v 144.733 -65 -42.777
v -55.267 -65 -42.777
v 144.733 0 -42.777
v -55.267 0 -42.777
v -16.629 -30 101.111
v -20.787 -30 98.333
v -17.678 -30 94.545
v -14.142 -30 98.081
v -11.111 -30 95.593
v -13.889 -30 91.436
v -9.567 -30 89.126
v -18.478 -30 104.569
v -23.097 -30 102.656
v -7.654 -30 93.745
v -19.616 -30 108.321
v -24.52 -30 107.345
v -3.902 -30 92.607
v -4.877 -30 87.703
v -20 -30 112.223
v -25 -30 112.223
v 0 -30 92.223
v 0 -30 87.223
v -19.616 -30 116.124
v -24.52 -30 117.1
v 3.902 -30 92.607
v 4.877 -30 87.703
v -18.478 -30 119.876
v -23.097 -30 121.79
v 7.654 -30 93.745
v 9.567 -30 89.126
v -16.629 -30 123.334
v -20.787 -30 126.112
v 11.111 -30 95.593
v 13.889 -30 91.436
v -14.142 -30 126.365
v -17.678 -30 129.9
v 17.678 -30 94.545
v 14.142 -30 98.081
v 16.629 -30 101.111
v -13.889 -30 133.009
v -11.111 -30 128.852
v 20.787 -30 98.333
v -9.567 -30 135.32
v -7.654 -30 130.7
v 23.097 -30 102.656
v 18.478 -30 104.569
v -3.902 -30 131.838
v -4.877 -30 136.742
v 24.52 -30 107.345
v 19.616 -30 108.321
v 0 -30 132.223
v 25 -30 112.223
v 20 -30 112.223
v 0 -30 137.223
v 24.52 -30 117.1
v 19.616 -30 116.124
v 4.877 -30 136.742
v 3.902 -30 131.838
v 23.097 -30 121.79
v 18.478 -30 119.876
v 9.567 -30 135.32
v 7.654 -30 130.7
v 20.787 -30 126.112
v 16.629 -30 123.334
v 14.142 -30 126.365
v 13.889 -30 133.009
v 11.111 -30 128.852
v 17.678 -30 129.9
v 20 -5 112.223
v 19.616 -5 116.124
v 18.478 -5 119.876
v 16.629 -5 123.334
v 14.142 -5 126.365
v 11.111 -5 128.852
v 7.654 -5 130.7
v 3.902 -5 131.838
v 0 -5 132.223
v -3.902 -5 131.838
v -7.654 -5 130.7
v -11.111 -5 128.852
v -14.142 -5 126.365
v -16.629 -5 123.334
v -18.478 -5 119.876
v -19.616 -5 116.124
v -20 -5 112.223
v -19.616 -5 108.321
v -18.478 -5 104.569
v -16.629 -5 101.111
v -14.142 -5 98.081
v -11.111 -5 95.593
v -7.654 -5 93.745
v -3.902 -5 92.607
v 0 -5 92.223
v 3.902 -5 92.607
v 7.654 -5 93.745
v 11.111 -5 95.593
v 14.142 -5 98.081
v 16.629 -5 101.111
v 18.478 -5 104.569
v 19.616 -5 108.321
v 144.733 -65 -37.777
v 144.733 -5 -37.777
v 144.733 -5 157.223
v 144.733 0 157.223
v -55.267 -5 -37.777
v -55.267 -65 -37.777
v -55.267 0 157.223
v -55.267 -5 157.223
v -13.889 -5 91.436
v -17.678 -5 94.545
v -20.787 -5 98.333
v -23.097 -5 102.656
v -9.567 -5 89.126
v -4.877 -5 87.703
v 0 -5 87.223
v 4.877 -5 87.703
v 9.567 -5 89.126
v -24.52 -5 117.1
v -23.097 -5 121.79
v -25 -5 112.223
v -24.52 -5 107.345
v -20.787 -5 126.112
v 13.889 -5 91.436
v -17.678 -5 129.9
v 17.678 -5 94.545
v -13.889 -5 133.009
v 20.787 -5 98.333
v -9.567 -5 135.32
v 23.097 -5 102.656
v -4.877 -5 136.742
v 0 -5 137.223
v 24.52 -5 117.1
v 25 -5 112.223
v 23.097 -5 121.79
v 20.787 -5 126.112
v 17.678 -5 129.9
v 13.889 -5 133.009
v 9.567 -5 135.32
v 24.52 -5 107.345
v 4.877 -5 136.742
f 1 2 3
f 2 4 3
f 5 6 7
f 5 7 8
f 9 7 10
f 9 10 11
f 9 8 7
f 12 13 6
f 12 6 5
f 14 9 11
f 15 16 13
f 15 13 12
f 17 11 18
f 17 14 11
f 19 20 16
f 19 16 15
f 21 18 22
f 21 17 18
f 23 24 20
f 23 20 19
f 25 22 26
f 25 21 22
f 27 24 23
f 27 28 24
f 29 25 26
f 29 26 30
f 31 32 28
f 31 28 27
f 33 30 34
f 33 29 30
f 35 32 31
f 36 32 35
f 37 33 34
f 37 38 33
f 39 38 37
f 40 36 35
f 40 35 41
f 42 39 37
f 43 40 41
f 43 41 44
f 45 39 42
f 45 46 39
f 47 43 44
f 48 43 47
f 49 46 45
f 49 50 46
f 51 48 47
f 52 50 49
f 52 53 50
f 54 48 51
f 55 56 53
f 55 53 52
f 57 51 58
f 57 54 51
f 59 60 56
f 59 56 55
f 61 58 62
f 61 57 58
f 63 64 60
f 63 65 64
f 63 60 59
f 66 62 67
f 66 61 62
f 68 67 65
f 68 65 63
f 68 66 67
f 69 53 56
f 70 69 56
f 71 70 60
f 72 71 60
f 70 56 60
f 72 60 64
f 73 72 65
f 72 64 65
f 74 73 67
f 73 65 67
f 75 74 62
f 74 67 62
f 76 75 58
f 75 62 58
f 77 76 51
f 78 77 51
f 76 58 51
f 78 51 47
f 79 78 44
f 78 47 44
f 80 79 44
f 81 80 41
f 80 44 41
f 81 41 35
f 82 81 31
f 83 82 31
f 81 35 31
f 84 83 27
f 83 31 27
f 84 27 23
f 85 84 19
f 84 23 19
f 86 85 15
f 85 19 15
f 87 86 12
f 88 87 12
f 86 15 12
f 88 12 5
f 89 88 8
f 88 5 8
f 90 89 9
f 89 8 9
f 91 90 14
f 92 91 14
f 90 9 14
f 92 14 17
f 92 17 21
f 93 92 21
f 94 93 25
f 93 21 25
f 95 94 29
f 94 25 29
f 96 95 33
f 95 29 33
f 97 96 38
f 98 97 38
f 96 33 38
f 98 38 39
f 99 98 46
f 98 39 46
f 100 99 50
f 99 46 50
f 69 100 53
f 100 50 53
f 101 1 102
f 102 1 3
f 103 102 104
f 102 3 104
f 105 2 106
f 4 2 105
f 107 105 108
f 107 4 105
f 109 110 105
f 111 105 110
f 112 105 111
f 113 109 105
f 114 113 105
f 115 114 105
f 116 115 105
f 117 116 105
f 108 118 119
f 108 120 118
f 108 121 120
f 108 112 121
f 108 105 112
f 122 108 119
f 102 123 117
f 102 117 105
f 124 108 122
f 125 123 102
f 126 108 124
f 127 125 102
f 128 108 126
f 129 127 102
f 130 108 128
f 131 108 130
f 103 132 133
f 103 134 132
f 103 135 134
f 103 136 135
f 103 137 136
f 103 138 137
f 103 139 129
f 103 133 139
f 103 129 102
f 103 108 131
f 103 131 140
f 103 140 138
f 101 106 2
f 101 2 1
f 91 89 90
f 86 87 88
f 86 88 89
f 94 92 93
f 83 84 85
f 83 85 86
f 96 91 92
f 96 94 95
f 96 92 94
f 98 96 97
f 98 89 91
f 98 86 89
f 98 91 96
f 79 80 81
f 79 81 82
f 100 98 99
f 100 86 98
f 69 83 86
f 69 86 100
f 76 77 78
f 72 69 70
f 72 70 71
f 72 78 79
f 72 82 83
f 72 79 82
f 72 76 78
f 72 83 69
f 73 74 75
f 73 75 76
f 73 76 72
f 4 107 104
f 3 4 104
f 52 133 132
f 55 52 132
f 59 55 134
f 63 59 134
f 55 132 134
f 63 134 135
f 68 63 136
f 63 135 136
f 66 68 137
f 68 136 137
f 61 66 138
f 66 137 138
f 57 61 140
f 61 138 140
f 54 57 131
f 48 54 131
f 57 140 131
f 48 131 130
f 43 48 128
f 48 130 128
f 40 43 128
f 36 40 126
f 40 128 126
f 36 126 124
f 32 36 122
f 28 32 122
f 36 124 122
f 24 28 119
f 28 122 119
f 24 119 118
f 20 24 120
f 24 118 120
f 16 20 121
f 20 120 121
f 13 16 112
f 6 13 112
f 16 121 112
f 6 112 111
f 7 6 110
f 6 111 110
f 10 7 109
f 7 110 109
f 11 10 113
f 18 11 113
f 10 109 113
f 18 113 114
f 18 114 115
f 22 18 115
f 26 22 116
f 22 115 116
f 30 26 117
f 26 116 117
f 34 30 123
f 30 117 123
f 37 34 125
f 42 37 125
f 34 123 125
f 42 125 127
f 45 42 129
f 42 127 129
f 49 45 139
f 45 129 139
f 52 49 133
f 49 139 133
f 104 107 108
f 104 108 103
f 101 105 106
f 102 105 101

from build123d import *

# Parameters (mm, degrees)
F0_W     = 200
F0_H     = 200
F1_DEPTH = 5
F2_W     = 200
F2_H     = 5
F3_DEPTH = 60
F4_R     = 25
F5_DEPTH = 25
F6_R     = 20
F7_DEPTH = 25


with BuildPart() as f1:
    # F0 (on Front) → F1 (new body)
    with BuildSketch(Plane.XZ):
        with Locations((44.733446, 57.222639)):
            Rectangle(F0_W, F0_H)
    extrude(amount=F1_DEPTH)

    # F2 (on face) → F3 (join)
    with BuildSketch(Plane.XZ.offset(5)):
        with Locations((44.733446, -40.277361)):
            Rectangle(F2_W, F2_H)
    extrude(amount=F3_DEPTH)

    # F4 (on face) → F5 (join)
    with BuildSketch(Plane.XZ.offset(5)):
        with Locations((0, 112.222639)):
            Circle(F4_R)
    extrude(amount=F5_DEPTH)

    # F6 (on face) → F7 (cut)
    with BuildSketch(Plane.XZ.offset(30)):
        with Locations((0, 112.222639)):
            Circle(F6_R)
    extrude(amount=-F7_DEPTH, mode=Mode.SUBTRACT)


solid = f1.part
